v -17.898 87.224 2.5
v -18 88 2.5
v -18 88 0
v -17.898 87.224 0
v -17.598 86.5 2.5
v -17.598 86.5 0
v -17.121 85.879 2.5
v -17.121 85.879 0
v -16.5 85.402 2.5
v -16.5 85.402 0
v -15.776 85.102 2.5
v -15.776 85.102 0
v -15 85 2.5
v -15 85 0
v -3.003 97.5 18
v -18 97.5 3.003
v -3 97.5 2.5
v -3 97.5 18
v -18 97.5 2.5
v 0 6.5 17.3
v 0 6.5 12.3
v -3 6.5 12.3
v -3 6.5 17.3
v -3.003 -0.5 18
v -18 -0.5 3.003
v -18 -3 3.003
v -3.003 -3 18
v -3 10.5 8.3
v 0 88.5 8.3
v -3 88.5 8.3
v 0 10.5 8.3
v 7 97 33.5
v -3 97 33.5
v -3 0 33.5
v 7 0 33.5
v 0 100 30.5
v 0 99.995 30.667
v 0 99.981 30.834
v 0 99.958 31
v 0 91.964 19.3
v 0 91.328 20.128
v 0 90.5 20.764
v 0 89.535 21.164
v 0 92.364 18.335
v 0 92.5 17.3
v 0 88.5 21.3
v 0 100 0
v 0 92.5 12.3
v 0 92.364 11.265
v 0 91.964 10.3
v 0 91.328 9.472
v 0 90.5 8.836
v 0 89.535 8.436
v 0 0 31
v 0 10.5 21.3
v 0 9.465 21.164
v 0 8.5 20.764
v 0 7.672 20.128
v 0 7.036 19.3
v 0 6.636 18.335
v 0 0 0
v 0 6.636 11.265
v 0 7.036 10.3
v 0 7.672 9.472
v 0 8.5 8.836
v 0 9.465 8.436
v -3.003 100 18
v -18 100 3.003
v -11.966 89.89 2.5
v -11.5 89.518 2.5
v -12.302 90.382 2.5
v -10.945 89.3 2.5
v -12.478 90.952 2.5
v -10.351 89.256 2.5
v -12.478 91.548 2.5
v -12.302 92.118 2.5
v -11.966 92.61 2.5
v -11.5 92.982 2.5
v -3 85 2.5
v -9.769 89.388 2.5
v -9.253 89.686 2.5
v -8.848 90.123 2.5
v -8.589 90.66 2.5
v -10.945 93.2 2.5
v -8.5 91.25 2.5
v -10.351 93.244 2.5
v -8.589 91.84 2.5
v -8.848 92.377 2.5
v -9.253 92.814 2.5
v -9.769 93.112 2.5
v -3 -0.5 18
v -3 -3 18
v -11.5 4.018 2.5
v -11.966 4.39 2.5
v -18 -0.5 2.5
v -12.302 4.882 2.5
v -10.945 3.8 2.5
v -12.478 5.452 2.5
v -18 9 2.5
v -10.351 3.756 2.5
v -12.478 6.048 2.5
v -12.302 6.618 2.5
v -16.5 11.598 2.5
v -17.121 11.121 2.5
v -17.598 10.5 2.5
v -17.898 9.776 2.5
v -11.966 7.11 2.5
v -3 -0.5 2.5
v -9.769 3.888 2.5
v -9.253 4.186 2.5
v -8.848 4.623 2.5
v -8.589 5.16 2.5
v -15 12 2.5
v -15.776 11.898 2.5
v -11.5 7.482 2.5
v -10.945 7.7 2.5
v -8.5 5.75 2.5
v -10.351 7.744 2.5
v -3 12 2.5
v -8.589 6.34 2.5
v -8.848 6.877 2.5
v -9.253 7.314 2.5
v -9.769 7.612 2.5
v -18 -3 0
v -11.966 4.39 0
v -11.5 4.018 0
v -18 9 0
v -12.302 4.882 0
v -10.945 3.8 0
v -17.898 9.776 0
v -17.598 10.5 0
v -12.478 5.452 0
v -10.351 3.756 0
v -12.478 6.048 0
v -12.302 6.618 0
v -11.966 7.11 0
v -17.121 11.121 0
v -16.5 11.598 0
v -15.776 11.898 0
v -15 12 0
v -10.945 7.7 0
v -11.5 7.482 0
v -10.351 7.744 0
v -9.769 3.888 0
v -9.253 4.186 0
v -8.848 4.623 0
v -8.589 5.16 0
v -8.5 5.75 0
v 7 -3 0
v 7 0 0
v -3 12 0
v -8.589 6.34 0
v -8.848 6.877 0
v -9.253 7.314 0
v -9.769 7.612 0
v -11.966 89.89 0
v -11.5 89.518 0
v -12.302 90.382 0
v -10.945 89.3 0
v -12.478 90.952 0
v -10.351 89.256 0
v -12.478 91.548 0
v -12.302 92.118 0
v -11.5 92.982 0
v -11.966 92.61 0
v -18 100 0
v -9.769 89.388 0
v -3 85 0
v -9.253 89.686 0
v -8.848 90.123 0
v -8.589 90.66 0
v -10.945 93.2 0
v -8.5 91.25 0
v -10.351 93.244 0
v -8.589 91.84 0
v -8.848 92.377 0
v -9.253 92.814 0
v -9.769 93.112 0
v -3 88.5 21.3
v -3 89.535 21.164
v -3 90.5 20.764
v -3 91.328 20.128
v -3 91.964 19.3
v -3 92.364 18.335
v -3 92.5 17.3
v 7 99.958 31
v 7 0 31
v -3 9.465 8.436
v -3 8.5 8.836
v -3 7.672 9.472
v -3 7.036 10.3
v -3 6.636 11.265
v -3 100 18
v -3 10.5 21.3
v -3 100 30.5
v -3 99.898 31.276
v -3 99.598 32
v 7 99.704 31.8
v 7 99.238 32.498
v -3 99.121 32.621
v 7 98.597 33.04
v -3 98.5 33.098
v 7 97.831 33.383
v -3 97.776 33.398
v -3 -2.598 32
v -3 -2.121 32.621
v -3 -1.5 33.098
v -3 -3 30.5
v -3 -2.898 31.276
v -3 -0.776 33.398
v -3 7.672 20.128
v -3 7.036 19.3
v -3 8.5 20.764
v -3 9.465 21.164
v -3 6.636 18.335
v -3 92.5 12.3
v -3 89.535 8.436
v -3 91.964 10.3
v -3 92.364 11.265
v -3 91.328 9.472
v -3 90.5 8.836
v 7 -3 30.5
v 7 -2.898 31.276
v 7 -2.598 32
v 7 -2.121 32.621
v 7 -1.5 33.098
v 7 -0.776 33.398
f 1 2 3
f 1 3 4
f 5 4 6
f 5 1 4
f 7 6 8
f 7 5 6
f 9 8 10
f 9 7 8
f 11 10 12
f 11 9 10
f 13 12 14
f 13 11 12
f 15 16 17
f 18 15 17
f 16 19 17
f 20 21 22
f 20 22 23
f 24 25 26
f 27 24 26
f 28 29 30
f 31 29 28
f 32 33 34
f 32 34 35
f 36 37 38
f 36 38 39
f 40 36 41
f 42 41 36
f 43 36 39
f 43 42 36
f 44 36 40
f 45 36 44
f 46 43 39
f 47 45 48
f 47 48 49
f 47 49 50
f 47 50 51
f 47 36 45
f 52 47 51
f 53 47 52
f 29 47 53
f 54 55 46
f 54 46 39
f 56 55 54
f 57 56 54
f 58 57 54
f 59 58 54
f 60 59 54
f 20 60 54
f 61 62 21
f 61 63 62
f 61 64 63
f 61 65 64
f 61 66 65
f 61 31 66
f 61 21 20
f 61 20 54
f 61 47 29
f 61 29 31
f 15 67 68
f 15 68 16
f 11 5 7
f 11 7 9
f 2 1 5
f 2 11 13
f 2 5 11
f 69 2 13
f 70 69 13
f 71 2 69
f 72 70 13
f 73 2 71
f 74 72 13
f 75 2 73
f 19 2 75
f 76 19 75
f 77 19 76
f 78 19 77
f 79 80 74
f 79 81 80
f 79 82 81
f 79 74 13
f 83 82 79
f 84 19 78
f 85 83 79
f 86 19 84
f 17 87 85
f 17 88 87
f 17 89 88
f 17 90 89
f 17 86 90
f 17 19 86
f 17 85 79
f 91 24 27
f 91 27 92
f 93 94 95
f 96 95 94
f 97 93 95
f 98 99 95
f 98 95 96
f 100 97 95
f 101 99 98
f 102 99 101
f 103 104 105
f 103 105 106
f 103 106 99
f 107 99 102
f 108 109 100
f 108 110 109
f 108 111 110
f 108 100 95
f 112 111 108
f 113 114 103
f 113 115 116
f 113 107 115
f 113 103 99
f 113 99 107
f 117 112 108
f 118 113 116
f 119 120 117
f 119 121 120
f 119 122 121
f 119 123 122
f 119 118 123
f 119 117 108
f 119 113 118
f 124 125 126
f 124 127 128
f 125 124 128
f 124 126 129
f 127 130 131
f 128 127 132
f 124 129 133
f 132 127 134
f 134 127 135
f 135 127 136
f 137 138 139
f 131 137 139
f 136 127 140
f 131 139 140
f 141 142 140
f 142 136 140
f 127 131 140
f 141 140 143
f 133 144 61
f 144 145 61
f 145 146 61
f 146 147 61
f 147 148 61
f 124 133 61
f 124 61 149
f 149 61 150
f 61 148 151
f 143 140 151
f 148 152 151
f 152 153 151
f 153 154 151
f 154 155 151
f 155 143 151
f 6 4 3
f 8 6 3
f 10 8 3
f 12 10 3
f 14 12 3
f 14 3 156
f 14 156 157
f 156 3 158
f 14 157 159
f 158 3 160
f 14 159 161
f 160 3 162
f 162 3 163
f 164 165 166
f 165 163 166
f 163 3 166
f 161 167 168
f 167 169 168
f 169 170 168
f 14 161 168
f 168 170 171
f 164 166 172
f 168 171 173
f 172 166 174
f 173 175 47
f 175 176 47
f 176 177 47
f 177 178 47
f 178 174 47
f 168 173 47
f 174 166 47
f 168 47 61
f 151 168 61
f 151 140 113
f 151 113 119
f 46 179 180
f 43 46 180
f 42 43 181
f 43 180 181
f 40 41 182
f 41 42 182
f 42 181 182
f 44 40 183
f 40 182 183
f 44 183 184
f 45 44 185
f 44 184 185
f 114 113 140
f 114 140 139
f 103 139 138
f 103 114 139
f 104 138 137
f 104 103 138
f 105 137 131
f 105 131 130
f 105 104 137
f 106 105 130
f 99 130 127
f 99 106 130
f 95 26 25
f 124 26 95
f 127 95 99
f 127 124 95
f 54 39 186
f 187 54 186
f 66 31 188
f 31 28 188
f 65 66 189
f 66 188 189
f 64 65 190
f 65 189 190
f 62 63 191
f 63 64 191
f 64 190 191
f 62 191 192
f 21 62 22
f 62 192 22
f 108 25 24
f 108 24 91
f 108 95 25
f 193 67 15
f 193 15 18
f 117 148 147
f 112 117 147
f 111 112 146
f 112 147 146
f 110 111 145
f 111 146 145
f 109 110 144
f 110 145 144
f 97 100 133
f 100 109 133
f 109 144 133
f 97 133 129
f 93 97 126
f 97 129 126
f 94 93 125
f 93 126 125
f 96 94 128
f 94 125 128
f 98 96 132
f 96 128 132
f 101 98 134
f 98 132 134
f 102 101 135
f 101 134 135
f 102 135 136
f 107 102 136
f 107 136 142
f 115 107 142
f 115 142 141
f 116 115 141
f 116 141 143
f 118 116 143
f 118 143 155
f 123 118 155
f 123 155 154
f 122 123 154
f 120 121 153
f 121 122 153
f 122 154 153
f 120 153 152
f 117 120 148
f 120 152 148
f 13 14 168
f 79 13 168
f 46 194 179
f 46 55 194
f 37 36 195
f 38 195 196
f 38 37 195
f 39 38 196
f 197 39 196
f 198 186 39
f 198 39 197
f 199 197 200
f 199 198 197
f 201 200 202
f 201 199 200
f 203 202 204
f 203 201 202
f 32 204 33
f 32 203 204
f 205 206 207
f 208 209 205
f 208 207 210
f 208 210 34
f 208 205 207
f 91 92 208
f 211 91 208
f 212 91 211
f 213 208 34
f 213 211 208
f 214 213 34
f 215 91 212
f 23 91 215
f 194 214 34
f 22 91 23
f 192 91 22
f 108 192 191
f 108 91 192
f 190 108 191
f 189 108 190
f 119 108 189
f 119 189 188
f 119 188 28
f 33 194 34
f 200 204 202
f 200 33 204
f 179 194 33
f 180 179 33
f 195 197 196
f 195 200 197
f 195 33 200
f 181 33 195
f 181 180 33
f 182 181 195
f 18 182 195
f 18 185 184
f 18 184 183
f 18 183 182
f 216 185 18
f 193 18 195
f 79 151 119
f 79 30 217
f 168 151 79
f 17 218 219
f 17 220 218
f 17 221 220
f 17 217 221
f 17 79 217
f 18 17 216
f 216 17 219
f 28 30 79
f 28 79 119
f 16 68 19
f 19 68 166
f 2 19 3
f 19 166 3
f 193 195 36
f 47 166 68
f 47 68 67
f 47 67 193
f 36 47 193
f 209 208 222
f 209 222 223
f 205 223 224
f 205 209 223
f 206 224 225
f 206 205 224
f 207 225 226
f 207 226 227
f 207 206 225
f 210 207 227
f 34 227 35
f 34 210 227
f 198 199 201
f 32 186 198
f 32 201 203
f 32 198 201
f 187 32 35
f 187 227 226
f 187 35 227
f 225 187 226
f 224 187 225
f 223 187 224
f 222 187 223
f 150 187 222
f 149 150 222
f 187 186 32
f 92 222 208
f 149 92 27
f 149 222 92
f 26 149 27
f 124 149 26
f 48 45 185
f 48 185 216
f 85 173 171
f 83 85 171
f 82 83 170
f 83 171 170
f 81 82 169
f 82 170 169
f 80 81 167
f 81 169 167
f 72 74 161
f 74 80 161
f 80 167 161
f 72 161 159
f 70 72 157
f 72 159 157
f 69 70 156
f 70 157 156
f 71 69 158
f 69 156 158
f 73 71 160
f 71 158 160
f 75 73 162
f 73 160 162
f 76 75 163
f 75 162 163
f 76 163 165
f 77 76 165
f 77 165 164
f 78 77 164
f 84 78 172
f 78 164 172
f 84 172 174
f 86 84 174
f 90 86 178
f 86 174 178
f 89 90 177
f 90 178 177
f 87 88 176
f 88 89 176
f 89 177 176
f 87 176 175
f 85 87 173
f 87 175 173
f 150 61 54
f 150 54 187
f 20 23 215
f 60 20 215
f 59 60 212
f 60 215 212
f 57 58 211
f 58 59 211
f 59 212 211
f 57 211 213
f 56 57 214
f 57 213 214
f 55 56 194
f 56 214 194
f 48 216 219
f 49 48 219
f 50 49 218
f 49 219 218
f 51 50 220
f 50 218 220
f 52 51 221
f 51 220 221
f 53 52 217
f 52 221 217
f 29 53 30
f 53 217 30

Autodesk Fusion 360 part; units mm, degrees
sketch "Switch" plane through (0, 0, 0) normal (0, 0, 1) x (1, 0, 0)
  line L0 (0, 0) -> (148, 0)
  line L1 (148, 0) -> (148, 100)
  line L2 (148, 100) -> (0, 100)
  line L3 (0, 100) -> (0, 0)
  line L4 (-3, 100) -> (7, 100)
  line L5 (7, 100) -> (7, -3)
  line L6 (7, -3) -> (-3, -3)
  line L7 (-3, -3) -> (-3, 100)
  line L8 (-3, 100) -> (-18, 100)
  line L9 (-18, 100) -> (-18, 85)
  line L10 (-18, 85) -> (-3, 85)
  line L11 (-3, 85) -> (-3, 100)
  line L12 (-3, -3) -> (-18, -3)
  line L13 (-18, -3) -> (-18, 12)
  line L14 (-18, 12) -> (-3, 12)
  line L15 (-3, 12) -> (-3, -3)
  circle A0 centre (-10.5, 5.75) radius 2
  circle A1 centre (-10.5, 91.25) radius 2
  line L16 (-3, -3) -> (-18, -3)
  line L17 (-18, -3) -> (-18, -0.5)
  line L18 (-18, -0.5) -> (-3, -0.5)
  line L19 (-3, -0.5) -> (-3, -3)
  line L20 (-3, 100) -> (-18, 100)
  line L21 (-18, 100) -> (-18, 97.5)
  line L22 (-18, 97.5) -> (-3, 97.5)
  line L23 (-3, 97.5) -> (-3, 100)
  dimension "d1" = 100
  dimension "d2" = 148
  dimension "d3" = 7
  dimension "d4" = 3
  dimension "d6" = 3
  dimension "d7" = 15
  dimension "d8" = 15
  dimension "d10" = 15
  dimension "d12" = 4
  dimension "d13" = 4
  dimension "d21" = 7.5
  dimension "d31" = 6.25
  dimension "d32" = 15
  dimension "d33" = 2.5
  dimension "d34" = 7.5
  dimension "d35" = 2.5
  dimension "d36" = 6.25
extrude "Extrude1" add sketch "Switch" along normal blind 33.5 contours L0 L3 L4 L5 L6 L7 L11 L15 L19 L23
extrude "Extrude2" add sketch "Switch" along normal blind 2.5 from surface at 31 contours L0 L2 L3 L4 L5
extrude "Extrude3" add sketch "Switch" along normal blind 2.5 contours L7 L9 L10 L11 L22 | L7 L13 L14 L15 L18
extrude "Extrude5" add sketch "Switch" along normal blind 18 contours L7 L8 L9 L11 L20 L21 L22 L23 | L7 L12 L13 L15 L16 L17 L18 L19
sketch "Venting hole" plane through (0, 0, 0) normal (1, 0, 0) x (0, 1, 0)
  line L0 (92.5, 8.3) -> (6.5, 8.3)
  line L1 (6.5, 8.3) -> (6.5, 21.3)
  line L2 (6.5, 21.3) -> (92.5, 21.3)
  line L3 (92.5, 21.3) -> (92.5, 8.3)
  line L4 (0, 0) -> (0, 31)
  line L5 (100, 0) -> (100, 18)
  point P0 (100, 0)
  dimension "d40" = 8.3
  dimension "d41" = 6.5
  dimension "d42" = 7.5
  dimension "d43" = 13
extrude "Extrude6" cut sketch "Venting hole" against normal blind 10
fillet "Fillet1" radius 4 4 edges at (-1.5, 6.5, 21.3) (-1.5, 6.5, 8.3) (-1.5, 92.5, 8.3) (-1.5, 92.5, 21.3)
fillet "Fillet2" radius 3 2 edges at (2, -3, 33.5) (2, 100, 33.5)
chamfer "Chamfer1" distance 15 angle 45 2 edges at (-18, 98.75, 18) (-18, -1.75, 18)
fillet "Fillet3" radius 3 2 edges at (-18, 12, 1.25) (-18, 85, 1.25)
